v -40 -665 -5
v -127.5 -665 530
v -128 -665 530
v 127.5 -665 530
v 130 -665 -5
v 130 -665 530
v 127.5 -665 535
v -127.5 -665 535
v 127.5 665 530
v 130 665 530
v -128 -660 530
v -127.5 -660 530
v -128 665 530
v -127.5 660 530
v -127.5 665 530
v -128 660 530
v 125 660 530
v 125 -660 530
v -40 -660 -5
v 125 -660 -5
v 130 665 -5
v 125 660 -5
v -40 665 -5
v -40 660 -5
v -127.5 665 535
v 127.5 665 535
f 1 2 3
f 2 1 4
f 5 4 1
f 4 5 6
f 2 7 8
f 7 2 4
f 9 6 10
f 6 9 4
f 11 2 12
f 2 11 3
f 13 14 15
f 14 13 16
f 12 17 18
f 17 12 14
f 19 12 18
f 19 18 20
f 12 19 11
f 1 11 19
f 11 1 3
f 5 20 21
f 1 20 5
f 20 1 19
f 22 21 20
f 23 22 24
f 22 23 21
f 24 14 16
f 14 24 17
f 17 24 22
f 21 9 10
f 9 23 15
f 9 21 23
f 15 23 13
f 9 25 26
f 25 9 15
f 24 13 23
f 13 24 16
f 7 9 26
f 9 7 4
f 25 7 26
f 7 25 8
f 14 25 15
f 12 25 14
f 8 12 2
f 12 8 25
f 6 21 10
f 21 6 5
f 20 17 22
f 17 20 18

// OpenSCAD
// file: ../config/parameters.scad
// Global Chassis Dimensions
chassis_width = 750;   
chassis_length = 1000;
drill_pattern_widths = [750, 650, 550];
drill_pattern_lengths = [750, 850, 1000];
base_plate_length = 1300;
connect_plate_thick = 10; 

// Beam Profile (Purchased Part)
beam_profile = 40;
beam_thickness = 3;    
beam_length = 1000;

// Upright & Cover
upright_height = 500;
top_side_width = 60;
cover_thick = 5;
cover_clearance = 10;  
cover_overlap = 10;
cover_total_height = 530; 

// Resolution & Preview
$fn = 60; 
exploded_view = false; 
explosion_dist = 800; 

// Motor & Wheel Data
tire_dia = 430;
tire_width = 100;
hub_dia = 160;
hub_width = 140; //specs from Quinder are: Fork width for mounting: 138mm
axle_dia = 10.2; //specs from Quinder are: Mounting hole: max 10.2mm
bolt_dia = 14.2;

// Bracket Geometry universal
bracket_thick = 5;
bracket_bolt_diameter = 10.4; //dikte van de gaten van gaten van de wiel_bracket     
tire_clearance = 130;      
side_plate_top_width = 240;
side_plate_width = 240;

//Side plate
axle_bottom_dist = 35;
extra_space_bracket = 40;
side_hole_start_from_bottom = 20; 
side_hole_pitch = 100; 

tab_length = 40;         // Lengte van de nok/sleuf
tab_offset_y = 40;       // Positie vanaf het midden over de Y-as (uit elkaar)
laser_tolerance = 0.5;   // Extra snijspeling zodat het makkelijk in elkaar schuift

//top plate
bracket_top_hole_dist_x = 80; // De totale gewenste afstand over de X-as
bracket_top_hole_dist_y = 130; // De totale gewenste afstand over de Y-as


arm_height = (tire_dia / 2) + tire_clearance;
inner_width = hub_width;
bracket_total_width = inner_width + (extra_space_bracket*2) + (2 * bracket_thick);
bracket_top_z = arm_height + bracket_thick;

// Axle bracket
axle_hex_width = 85;          
axle_hex_height = 40;
axle_hex_straight_part = 30;   
axle_bracket_thickness = 6;    

axle_hole_diameter = 10.3; //Dikte van het gaten in de axle_bracket
axle_hole_distance = 30; //hoogte vanaf de onderkant tot de wiel ophanging

axle_flat_width = axle_dia; // Gebruikt 10.2 uit parameters 
axle_round_dia = bolt_dia;  // Gebruikt 14.2 uit parameters
// main file
include <../config/parameters.scad>

module protection_cover(kant = 1) {
    eff_b = bracket_total_width + (2 * cover_clearance);
    eff_l = base_plate_length + (2 * cover_clearance);
    z_start = (connect_plate_thick / 2) - cover_overlap;
    h_wand = cover_total_height - z_start;
    
    // De ', 0.8' is verwijderd, waardoor het nu massief groen is
    color("green") translate([0, 0, z_start]) union() {
        translate([0, 0, h_wand + cover_thick/2])
            cube([eff_b + cover_thick, eff_l + (2 * cover_thick), cover_thick], center=true);
        translate([kant * (bracket_total_width/2 + cover_clearance + cover_thick/2), 0, h_wand/2])
            cube([cover_thick, eff_l + (2 * cover_thick), h_wand], center=true);
        for(y_pos = [-1, 1]) {
            translate([0, y_pos * (eff_l/2 + cover_thick/2), 0])
            rotate([270, 0, 0]) 
            linear_extrude(height = cover_thick, center = true)
                polygon([
                    [kant * (bracket_total_width/2 + cover_clearance + cover_thick/2), 0],
                    [kant * (bracket_total_width/2 + cover_clearance + cover_thick/2), -h_wand],
                    [-kant * (bracket_total_width/2 + cover_clearance + 3), -h_wand],
                    [-kant * (top_side_width/2 + cover_clearance), 0]
                ]);
        }
    }
}

// Voeg dit toe om de module te renderen:
protection_cover(kant = 1);
